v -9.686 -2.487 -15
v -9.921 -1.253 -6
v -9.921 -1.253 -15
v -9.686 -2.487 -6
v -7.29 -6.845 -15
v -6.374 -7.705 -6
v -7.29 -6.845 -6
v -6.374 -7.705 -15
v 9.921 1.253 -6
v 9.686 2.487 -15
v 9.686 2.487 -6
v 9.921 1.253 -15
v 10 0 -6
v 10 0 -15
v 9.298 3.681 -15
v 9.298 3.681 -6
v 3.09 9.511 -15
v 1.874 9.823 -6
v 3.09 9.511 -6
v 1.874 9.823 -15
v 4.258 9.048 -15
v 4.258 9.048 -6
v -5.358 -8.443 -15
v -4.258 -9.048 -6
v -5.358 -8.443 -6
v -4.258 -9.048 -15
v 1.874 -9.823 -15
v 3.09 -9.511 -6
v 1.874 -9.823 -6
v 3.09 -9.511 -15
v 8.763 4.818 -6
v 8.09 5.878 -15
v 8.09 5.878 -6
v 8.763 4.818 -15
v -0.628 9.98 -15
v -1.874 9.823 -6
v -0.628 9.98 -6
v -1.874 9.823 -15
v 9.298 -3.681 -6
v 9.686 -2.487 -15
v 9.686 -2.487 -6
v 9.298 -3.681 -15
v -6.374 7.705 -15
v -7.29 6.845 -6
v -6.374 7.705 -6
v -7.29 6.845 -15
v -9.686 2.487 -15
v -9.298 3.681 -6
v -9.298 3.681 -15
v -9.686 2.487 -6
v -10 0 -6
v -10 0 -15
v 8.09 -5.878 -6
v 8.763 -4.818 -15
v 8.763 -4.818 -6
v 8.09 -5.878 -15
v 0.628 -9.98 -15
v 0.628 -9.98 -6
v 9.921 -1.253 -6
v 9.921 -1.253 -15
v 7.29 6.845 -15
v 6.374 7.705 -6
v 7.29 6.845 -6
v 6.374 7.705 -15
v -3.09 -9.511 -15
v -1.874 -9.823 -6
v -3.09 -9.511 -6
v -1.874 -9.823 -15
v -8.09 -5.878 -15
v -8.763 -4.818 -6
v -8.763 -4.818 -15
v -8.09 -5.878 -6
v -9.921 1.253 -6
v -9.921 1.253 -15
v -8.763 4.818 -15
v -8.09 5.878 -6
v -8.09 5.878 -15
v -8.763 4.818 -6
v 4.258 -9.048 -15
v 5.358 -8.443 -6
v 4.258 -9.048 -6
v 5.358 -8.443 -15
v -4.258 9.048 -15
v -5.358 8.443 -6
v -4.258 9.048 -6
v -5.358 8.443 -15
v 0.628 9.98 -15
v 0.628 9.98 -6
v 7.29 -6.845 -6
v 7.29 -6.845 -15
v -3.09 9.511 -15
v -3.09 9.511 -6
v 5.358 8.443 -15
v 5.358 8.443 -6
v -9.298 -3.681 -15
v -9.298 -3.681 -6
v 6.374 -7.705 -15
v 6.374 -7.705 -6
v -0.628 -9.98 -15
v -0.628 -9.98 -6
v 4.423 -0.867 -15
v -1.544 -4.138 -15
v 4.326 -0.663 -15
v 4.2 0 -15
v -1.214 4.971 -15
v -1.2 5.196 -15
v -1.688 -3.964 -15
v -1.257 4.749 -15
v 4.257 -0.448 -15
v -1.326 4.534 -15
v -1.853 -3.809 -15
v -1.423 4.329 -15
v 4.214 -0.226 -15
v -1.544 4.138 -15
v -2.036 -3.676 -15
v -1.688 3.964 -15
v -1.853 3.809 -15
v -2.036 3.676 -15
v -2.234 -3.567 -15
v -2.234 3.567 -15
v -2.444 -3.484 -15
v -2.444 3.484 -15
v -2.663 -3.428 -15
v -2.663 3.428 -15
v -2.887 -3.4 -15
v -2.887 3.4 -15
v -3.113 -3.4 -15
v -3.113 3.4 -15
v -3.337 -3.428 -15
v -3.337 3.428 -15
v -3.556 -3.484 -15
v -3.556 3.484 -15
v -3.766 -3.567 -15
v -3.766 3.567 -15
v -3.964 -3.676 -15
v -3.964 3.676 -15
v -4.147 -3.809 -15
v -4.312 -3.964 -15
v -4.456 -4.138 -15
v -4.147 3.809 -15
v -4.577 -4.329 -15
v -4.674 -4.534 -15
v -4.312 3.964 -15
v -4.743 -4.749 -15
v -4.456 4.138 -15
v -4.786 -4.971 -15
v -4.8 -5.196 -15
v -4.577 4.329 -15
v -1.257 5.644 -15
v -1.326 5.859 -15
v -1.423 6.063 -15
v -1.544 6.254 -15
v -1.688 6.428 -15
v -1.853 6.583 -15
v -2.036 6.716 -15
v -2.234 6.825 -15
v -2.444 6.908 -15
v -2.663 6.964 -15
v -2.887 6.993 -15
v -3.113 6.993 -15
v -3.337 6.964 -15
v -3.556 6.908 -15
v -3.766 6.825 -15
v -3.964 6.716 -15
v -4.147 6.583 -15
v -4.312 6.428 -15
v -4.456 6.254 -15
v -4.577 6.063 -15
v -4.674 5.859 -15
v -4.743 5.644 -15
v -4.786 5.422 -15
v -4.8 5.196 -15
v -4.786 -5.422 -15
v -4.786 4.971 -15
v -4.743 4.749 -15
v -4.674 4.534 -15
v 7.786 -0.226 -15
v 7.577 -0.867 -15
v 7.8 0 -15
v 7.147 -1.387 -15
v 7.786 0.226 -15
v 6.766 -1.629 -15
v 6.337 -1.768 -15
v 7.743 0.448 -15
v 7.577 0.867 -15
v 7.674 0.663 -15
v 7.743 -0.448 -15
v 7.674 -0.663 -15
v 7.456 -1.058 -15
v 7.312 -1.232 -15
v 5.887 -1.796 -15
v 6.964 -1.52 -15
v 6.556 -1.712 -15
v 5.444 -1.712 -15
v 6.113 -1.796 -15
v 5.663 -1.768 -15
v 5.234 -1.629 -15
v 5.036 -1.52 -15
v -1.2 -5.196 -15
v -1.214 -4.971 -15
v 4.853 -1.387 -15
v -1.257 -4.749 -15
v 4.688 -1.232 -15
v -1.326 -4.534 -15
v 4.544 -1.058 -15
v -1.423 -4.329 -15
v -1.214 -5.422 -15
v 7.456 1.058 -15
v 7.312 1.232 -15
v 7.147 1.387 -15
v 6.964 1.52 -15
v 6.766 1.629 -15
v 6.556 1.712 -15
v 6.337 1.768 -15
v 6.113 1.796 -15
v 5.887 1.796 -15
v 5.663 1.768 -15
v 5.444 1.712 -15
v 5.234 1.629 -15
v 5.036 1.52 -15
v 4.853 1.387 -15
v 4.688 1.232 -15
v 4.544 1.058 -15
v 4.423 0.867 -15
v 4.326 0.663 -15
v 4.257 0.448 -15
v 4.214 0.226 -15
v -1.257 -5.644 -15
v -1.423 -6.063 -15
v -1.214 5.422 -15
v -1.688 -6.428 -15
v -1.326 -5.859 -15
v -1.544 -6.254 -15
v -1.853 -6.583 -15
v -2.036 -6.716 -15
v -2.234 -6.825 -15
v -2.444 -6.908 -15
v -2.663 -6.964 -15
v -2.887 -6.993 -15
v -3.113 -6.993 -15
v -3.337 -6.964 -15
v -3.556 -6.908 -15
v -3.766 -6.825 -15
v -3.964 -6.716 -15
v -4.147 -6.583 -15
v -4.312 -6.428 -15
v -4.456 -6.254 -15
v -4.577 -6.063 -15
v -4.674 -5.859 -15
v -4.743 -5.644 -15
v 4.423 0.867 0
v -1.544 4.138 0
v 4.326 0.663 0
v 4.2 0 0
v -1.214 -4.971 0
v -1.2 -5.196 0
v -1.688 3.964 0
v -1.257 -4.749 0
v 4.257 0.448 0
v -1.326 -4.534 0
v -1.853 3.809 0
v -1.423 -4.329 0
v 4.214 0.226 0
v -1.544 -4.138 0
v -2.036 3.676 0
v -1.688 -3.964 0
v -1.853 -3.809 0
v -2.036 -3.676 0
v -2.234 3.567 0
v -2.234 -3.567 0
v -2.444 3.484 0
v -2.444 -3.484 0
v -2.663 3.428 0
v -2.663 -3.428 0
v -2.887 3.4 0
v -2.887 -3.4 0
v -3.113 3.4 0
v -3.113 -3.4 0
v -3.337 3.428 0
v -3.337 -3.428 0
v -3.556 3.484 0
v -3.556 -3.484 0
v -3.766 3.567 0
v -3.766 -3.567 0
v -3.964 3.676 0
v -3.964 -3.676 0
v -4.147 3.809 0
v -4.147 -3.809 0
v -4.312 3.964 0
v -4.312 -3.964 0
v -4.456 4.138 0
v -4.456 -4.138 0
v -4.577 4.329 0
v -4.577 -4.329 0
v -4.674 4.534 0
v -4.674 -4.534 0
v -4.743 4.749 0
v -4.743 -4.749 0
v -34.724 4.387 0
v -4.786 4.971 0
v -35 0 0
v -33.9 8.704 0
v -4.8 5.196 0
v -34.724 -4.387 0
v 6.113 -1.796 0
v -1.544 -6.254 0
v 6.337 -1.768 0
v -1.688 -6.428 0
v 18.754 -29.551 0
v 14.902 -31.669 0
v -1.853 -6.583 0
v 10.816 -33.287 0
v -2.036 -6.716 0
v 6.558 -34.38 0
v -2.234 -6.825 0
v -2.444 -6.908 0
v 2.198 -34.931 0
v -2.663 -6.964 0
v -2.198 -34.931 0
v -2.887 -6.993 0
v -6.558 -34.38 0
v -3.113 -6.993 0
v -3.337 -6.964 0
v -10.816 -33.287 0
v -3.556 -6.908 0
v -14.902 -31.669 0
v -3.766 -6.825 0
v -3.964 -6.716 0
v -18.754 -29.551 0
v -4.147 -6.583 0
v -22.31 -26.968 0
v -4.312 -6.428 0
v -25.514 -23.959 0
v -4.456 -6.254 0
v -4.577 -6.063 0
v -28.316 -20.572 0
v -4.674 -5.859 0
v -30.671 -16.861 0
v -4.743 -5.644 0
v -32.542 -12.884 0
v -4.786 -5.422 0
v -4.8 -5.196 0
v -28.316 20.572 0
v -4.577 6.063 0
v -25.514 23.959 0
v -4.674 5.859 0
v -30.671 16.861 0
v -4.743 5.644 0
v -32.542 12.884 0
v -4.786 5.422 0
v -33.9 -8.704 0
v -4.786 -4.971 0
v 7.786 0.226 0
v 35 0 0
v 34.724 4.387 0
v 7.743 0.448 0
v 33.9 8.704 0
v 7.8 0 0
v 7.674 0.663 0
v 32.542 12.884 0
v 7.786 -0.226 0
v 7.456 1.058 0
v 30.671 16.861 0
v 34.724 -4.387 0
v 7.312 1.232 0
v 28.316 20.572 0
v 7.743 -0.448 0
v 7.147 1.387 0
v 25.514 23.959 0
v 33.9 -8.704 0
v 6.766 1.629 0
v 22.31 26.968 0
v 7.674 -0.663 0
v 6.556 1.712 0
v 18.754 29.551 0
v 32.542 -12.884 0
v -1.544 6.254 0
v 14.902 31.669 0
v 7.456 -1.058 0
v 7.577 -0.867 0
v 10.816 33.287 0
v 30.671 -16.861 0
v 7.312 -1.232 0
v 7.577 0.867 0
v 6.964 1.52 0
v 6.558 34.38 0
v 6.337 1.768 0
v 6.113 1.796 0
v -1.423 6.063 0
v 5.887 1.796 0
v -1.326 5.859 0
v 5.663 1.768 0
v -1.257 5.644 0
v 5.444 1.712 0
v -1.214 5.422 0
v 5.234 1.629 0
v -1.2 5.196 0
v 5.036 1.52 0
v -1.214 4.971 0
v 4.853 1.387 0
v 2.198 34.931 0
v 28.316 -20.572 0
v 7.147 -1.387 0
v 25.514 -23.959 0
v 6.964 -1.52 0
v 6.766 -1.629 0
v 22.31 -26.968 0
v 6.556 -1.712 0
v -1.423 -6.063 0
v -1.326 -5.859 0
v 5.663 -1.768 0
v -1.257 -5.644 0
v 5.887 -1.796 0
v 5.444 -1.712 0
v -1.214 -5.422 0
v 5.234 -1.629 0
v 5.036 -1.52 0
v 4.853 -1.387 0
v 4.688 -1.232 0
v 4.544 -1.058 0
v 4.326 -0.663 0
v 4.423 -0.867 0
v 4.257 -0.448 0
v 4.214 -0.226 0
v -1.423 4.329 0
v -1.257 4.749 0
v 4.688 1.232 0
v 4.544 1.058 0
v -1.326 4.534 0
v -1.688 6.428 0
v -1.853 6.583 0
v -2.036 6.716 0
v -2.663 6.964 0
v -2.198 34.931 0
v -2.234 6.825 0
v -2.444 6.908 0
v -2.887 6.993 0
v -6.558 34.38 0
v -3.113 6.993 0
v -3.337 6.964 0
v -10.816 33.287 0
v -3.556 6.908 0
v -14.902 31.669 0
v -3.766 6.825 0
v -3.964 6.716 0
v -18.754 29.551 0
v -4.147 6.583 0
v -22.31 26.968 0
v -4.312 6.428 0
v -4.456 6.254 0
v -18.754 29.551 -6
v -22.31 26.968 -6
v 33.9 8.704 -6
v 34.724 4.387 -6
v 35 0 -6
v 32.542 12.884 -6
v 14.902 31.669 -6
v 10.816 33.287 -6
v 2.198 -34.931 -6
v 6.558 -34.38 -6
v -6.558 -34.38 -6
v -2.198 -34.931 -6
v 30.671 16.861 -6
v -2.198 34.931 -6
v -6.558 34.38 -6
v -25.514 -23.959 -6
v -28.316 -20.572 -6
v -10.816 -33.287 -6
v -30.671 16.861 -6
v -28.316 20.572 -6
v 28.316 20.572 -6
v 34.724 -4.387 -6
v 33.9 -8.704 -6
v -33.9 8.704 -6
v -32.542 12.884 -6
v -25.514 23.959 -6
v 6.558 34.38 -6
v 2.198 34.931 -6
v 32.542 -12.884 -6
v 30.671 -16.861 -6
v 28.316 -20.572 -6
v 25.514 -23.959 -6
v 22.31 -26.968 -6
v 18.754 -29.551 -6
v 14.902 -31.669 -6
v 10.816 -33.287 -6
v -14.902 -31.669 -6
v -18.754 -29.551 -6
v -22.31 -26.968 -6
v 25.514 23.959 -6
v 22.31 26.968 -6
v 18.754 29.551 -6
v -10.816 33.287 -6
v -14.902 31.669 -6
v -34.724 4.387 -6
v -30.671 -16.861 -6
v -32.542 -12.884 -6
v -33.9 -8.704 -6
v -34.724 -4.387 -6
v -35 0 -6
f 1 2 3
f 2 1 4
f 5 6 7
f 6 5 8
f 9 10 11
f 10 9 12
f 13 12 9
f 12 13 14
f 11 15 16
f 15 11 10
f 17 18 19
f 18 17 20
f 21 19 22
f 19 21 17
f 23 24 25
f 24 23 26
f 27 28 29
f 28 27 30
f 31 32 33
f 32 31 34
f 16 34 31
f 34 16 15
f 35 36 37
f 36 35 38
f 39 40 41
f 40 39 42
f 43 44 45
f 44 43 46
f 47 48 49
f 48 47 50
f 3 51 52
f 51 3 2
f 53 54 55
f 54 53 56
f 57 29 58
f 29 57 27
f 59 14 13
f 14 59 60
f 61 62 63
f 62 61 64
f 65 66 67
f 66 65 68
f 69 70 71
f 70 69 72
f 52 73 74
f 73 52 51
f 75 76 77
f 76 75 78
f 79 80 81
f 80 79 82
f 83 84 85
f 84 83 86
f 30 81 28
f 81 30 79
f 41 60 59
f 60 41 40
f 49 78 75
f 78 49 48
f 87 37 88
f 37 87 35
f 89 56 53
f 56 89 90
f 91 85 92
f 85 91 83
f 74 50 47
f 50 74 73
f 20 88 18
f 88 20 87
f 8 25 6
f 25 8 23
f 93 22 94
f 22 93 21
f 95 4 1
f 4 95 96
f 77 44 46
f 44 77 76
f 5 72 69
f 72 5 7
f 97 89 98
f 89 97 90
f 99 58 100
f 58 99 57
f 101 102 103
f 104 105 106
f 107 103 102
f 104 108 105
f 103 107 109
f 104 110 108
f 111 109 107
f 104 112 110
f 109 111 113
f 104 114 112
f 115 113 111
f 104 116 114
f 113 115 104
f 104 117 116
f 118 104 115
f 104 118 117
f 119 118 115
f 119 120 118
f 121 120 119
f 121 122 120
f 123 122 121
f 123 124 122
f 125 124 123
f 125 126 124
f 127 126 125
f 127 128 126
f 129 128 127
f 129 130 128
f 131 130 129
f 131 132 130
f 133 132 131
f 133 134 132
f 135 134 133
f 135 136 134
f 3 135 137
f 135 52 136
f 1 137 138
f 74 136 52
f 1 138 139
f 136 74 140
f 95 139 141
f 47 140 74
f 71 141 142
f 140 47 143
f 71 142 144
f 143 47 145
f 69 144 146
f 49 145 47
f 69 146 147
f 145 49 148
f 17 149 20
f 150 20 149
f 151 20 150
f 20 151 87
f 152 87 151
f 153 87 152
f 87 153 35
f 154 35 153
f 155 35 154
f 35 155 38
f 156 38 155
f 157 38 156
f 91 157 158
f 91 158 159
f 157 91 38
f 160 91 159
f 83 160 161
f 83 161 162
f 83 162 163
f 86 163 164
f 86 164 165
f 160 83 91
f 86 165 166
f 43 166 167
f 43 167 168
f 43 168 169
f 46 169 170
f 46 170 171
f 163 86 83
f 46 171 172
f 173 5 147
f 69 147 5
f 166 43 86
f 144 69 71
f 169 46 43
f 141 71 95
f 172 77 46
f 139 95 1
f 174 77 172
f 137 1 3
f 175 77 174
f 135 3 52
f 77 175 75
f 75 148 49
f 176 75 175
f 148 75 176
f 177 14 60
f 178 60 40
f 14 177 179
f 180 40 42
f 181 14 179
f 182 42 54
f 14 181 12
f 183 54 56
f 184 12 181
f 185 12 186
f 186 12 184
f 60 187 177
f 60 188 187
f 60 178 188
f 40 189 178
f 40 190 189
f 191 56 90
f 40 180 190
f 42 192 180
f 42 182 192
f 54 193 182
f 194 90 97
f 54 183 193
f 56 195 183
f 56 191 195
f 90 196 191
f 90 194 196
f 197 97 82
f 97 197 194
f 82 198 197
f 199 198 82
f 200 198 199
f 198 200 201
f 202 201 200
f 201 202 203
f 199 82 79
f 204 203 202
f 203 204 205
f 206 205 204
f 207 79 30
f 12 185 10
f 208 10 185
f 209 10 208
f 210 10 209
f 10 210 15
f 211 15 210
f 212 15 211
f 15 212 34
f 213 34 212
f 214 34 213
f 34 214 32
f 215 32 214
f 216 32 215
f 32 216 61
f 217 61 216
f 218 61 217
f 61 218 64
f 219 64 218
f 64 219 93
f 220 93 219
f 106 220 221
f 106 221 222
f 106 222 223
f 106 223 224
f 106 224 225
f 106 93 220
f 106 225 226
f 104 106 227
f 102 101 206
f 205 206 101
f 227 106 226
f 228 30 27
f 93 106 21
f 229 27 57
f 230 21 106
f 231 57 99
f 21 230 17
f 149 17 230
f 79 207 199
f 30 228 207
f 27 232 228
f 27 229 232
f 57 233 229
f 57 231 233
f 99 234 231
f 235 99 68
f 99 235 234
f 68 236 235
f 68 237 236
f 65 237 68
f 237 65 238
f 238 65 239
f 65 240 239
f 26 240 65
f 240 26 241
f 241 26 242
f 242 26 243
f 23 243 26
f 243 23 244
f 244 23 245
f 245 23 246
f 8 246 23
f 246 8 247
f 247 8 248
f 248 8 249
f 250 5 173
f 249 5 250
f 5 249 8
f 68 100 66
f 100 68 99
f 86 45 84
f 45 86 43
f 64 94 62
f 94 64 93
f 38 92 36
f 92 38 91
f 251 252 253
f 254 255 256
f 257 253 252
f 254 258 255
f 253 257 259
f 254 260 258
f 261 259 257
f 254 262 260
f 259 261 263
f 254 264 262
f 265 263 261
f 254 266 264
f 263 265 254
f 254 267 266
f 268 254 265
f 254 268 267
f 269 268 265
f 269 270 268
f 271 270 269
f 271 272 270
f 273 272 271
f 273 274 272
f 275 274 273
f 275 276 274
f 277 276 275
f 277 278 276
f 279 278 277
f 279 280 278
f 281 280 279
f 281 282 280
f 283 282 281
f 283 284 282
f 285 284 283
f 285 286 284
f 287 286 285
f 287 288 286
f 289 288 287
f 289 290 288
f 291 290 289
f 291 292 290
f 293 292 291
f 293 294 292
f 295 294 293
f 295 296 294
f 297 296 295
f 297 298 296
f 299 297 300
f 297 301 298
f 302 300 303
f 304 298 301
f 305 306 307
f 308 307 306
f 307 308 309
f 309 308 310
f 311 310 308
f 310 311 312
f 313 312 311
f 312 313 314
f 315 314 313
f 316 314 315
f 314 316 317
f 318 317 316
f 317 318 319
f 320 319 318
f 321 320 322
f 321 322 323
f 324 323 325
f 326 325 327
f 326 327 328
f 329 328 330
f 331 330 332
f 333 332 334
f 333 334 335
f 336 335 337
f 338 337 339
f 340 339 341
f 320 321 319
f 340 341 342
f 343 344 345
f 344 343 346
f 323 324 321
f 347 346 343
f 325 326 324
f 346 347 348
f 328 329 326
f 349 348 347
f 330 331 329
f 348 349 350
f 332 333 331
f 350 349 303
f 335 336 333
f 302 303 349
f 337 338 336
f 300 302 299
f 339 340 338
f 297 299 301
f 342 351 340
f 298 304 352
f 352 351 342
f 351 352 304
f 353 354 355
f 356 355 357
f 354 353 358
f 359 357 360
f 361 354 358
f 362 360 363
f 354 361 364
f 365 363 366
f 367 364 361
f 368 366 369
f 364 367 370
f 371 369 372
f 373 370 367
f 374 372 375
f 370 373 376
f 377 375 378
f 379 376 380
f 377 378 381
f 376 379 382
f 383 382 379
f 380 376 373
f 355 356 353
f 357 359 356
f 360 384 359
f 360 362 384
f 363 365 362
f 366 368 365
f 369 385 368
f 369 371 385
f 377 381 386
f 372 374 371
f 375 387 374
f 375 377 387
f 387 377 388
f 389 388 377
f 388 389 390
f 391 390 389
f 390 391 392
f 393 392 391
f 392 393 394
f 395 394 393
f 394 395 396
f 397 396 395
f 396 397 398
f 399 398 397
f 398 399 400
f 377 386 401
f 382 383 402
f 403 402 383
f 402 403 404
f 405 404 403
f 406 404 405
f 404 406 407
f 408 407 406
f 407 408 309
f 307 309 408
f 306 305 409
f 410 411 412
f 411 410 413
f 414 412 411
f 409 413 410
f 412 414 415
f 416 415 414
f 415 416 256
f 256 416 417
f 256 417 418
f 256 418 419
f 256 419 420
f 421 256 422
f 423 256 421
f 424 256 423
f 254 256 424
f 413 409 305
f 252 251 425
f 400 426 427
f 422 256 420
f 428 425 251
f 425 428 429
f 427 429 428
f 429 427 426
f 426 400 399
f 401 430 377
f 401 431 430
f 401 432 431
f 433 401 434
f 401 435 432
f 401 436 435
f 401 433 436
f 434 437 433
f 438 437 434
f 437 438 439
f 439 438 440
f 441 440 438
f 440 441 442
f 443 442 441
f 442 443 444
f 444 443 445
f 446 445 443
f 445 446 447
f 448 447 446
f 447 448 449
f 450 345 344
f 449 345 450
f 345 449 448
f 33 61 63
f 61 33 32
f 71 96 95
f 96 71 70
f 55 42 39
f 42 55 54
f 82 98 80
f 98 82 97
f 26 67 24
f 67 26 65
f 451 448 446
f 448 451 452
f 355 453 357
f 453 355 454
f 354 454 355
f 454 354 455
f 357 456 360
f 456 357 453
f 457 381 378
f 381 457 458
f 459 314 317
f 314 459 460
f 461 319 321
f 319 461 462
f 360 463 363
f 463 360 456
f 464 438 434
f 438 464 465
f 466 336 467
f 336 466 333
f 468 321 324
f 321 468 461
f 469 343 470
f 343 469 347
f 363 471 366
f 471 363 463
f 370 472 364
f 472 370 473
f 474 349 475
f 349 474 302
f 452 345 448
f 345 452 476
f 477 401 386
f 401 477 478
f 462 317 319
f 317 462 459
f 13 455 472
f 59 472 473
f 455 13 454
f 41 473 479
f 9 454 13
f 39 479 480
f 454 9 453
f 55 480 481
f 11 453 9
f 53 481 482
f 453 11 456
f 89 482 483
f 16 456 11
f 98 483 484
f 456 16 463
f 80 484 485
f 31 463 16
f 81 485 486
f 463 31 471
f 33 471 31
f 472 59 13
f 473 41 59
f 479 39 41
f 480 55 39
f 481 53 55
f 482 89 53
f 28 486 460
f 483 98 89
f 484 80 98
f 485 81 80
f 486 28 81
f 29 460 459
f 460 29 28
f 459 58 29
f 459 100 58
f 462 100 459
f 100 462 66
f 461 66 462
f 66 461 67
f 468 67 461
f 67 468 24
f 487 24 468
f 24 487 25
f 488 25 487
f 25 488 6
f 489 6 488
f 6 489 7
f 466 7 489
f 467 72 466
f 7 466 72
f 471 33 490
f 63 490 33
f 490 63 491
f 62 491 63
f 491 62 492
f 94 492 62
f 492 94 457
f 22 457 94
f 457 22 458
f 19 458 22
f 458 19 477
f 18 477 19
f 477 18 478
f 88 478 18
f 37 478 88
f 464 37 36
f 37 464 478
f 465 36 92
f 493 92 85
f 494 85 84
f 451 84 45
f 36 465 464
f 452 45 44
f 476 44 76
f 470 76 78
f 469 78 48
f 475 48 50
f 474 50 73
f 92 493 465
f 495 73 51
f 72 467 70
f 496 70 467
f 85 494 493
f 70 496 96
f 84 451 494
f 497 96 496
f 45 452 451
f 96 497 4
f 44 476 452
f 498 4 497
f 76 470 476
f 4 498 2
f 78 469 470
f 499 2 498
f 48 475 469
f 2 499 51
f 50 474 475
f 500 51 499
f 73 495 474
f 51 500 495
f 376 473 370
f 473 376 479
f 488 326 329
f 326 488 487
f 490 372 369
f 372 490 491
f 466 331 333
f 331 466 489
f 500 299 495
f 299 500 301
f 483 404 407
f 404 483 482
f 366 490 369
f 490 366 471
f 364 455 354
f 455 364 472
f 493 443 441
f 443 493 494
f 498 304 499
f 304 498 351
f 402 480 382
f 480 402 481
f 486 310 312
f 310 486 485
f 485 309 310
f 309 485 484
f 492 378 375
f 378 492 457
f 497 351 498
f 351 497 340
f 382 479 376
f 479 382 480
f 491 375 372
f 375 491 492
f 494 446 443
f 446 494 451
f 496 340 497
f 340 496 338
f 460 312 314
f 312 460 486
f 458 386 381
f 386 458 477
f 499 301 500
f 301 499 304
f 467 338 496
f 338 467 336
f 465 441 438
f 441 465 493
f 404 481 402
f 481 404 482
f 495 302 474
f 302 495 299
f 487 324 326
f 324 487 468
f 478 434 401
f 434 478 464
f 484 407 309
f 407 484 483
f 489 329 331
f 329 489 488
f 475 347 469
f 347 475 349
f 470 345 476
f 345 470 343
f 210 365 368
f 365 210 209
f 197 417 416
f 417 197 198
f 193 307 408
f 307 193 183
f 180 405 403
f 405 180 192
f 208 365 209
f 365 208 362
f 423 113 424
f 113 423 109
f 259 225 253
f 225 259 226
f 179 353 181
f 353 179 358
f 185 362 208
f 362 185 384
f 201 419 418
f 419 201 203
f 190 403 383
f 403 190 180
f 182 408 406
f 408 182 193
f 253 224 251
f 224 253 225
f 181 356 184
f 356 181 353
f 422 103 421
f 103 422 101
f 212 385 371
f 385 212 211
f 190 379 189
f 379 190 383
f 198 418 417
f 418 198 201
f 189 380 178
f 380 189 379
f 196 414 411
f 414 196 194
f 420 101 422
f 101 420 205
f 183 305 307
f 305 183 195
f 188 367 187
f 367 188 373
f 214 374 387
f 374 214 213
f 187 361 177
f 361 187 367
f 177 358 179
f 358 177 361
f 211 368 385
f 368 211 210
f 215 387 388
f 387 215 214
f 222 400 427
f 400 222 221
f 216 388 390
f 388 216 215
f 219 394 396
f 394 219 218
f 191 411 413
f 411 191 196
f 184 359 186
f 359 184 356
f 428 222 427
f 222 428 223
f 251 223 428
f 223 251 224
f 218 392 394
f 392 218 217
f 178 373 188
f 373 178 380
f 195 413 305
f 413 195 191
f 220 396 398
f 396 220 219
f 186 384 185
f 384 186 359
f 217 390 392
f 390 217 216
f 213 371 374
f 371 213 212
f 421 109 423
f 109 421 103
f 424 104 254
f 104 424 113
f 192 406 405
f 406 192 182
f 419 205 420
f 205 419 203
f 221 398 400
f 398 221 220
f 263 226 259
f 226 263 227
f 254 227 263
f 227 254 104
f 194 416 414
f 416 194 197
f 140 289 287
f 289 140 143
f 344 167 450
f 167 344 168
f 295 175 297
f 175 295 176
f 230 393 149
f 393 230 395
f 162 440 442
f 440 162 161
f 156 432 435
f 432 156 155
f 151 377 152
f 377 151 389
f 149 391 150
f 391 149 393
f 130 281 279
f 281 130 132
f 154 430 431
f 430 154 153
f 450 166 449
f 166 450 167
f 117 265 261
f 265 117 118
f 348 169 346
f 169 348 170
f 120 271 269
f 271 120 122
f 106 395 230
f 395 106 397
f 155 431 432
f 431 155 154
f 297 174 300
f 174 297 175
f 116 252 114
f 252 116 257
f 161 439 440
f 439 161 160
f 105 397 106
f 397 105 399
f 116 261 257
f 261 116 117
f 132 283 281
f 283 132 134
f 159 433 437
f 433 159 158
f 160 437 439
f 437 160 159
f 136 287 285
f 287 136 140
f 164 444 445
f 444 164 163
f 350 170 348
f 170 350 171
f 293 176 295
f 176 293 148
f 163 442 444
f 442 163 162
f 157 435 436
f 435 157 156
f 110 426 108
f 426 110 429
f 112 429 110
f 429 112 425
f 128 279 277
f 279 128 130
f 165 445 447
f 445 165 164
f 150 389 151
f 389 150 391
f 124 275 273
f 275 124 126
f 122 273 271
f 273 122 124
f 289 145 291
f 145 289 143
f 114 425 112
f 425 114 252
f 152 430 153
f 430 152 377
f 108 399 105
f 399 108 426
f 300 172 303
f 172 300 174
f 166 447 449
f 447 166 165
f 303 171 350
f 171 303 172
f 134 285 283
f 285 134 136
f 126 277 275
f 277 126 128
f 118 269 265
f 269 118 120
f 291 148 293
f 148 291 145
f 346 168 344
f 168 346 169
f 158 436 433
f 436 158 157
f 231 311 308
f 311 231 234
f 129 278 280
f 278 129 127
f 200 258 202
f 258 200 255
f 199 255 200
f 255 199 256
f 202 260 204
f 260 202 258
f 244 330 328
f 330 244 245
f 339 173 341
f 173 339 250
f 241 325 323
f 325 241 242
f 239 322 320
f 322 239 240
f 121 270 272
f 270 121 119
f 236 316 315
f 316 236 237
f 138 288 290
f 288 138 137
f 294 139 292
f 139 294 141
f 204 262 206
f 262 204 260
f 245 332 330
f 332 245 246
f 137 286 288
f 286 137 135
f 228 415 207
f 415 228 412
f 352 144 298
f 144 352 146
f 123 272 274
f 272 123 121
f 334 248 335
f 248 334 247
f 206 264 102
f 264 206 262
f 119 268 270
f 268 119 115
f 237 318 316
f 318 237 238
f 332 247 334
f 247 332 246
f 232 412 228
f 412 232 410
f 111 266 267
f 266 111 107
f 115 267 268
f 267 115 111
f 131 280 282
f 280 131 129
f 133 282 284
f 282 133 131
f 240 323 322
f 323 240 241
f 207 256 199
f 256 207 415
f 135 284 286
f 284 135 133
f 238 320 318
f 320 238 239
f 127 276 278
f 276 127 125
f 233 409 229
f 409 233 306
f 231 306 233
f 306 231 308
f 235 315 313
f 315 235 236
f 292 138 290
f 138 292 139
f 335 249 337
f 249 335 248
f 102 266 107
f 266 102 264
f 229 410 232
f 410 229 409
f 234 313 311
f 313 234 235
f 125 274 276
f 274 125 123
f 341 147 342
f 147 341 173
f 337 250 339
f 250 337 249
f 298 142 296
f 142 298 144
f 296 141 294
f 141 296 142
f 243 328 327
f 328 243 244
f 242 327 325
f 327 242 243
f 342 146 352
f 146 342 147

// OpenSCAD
$fn = 50;


difference() {
	union() {
		translate(v = [0, 0, -15.0000000000]) {
			cylinder(h = 15, r = 10.0000000000);
		}
		translate(v = [0, 0, -6.0000000000]) {
			cylinder(h = 6, r = 35.0000000000);
		}
	}
	union() {
		#translate(v = [6.0000000000, 0.0000000000, -15]) {
			cylinder(h = 15, r = 1.8000000000);
		}
		#translate(v = [-3.0000000000, 5.1961524227, -15]) {
			cylinder(h = 15, r = 1.8000000000);
		}
		#translate(v = [-3.0000000000, -5.1961524227, -15]) {
			cylinder(h = 15, r = 1.8000000000);
		}
	}
}
